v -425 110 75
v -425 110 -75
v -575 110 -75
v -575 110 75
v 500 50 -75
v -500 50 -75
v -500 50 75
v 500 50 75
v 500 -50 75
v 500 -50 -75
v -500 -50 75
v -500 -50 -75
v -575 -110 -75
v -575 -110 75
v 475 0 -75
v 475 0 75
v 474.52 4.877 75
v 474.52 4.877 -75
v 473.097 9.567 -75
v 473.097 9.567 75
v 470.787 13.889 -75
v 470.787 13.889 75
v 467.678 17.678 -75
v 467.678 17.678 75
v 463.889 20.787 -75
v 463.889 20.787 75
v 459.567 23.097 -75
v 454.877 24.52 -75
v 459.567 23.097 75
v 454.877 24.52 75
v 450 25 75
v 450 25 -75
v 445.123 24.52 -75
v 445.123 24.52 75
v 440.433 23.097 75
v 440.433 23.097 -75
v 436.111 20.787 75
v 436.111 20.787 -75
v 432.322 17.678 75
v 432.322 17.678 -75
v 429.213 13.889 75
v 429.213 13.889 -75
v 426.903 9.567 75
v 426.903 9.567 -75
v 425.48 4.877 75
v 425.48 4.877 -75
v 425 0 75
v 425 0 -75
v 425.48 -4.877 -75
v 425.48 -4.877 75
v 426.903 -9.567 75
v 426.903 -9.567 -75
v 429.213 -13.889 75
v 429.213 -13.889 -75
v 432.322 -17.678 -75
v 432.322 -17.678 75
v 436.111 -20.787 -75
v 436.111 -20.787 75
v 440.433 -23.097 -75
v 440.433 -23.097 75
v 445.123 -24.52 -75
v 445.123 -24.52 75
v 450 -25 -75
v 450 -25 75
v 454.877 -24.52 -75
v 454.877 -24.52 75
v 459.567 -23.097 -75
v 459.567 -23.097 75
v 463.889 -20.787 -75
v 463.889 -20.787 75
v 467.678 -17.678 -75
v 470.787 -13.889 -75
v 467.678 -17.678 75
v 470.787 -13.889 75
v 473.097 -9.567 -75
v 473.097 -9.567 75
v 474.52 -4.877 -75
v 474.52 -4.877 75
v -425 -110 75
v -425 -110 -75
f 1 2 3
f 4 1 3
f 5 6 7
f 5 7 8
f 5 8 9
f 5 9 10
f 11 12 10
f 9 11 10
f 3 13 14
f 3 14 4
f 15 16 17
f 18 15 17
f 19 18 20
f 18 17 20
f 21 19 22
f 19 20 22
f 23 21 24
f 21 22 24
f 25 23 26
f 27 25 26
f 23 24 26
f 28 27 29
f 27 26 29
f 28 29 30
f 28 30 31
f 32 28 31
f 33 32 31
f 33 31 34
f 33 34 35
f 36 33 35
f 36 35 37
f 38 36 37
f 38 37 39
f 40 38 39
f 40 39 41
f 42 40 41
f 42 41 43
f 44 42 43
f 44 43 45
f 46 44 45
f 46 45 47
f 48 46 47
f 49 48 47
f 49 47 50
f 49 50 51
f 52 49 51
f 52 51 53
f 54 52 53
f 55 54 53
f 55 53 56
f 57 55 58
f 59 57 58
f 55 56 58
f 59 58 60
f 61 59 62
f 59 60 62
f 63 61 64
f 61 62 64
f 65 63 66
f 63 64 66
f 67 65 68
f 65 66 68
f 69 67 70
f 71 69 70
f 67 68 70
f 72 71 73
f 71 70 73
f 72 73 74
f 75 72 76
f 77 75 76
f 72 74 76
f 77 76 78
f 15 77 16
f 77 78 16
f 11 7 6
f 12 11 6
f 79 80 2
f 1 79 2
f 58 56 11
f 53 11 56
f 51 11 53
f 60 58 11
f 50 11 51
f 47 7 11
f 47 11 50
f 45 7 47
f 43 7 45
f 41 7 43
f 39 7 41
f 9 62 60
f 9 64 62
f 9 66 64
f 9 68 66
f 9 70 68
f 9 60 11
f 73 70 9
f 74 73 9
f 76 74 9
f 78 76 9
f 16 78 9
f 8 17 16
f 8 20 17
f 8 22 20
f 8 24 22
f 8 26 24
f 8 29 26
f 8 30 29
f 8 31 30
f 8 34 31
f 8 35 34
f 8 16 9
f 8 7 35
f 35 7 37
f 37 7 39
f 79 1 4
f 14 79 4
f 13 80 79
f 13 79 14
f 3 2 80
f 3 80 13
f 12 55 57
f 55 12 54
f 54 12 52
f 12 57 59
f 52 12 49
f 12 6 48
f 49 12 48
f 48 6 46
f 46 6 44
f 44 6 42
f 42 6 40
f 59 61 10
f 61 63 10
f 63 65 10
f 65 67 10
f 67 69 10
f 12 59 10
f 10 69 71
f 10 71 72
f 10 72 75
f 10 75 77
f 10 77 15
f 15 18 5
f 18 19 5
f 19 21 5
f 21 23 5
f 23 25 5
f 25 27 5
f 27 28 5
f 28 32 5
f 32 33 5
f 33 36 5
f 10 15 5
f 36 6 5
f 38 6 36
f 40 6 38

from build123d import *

# Parameters (mm, degrees)
SKETCH1_W           = 1000
SKETCH1_H           = 150
BOSS_EXTRUDE1_DEPTH = 50
SKETCH2_R           = 25
CUT_EXTRUDE1_DEPTH  = 151
SKETCH4_W           = 150
SKETCH4_H           = 220
BOSS_EXTRUDE3_DEPTH = 150


with BuildPart() as part:
    # Sketch1 → Boss-Extrude1 (new body, symmetric)
    with BuildSketch(Plane(origin=(0, 0, 0), x_dir=(1, 0, 0), z_dir=(0, 1, 0))):
        Rectangle(SKETCH1_W, SKETCH1_H)
    extrude(amount=BOSS_EXTRUDE1_DEPTH, both=True)

    # Sketch2 → Cut-Extrude1 (cut, through all)
    with BuildSketch(Plane.XY.offset(75)):
        with Locations((450, 0)):
            Circle(SKETCH2_R)
    extrude(amount=-CUT_EXTRUDE1_DEPTH, mode=Mode.SUBTRACT)


with BuildPart() as body_2:
    # Sketch4 → Boss-Extrude3 (new body)
    with BuildSketch(Plane(origin=(0, 0, -75), x_dir=(-1, 0, 0), z_dir=(0, 0, -1))):
        with Locations((500, 0)):
            Rectangle(SKETCH4_W, SKETCH4_H)
    extrude(amount=-BOSS_EXTRUDE3_DEPTH)


solid = Compound([part.part, body_2.part])
